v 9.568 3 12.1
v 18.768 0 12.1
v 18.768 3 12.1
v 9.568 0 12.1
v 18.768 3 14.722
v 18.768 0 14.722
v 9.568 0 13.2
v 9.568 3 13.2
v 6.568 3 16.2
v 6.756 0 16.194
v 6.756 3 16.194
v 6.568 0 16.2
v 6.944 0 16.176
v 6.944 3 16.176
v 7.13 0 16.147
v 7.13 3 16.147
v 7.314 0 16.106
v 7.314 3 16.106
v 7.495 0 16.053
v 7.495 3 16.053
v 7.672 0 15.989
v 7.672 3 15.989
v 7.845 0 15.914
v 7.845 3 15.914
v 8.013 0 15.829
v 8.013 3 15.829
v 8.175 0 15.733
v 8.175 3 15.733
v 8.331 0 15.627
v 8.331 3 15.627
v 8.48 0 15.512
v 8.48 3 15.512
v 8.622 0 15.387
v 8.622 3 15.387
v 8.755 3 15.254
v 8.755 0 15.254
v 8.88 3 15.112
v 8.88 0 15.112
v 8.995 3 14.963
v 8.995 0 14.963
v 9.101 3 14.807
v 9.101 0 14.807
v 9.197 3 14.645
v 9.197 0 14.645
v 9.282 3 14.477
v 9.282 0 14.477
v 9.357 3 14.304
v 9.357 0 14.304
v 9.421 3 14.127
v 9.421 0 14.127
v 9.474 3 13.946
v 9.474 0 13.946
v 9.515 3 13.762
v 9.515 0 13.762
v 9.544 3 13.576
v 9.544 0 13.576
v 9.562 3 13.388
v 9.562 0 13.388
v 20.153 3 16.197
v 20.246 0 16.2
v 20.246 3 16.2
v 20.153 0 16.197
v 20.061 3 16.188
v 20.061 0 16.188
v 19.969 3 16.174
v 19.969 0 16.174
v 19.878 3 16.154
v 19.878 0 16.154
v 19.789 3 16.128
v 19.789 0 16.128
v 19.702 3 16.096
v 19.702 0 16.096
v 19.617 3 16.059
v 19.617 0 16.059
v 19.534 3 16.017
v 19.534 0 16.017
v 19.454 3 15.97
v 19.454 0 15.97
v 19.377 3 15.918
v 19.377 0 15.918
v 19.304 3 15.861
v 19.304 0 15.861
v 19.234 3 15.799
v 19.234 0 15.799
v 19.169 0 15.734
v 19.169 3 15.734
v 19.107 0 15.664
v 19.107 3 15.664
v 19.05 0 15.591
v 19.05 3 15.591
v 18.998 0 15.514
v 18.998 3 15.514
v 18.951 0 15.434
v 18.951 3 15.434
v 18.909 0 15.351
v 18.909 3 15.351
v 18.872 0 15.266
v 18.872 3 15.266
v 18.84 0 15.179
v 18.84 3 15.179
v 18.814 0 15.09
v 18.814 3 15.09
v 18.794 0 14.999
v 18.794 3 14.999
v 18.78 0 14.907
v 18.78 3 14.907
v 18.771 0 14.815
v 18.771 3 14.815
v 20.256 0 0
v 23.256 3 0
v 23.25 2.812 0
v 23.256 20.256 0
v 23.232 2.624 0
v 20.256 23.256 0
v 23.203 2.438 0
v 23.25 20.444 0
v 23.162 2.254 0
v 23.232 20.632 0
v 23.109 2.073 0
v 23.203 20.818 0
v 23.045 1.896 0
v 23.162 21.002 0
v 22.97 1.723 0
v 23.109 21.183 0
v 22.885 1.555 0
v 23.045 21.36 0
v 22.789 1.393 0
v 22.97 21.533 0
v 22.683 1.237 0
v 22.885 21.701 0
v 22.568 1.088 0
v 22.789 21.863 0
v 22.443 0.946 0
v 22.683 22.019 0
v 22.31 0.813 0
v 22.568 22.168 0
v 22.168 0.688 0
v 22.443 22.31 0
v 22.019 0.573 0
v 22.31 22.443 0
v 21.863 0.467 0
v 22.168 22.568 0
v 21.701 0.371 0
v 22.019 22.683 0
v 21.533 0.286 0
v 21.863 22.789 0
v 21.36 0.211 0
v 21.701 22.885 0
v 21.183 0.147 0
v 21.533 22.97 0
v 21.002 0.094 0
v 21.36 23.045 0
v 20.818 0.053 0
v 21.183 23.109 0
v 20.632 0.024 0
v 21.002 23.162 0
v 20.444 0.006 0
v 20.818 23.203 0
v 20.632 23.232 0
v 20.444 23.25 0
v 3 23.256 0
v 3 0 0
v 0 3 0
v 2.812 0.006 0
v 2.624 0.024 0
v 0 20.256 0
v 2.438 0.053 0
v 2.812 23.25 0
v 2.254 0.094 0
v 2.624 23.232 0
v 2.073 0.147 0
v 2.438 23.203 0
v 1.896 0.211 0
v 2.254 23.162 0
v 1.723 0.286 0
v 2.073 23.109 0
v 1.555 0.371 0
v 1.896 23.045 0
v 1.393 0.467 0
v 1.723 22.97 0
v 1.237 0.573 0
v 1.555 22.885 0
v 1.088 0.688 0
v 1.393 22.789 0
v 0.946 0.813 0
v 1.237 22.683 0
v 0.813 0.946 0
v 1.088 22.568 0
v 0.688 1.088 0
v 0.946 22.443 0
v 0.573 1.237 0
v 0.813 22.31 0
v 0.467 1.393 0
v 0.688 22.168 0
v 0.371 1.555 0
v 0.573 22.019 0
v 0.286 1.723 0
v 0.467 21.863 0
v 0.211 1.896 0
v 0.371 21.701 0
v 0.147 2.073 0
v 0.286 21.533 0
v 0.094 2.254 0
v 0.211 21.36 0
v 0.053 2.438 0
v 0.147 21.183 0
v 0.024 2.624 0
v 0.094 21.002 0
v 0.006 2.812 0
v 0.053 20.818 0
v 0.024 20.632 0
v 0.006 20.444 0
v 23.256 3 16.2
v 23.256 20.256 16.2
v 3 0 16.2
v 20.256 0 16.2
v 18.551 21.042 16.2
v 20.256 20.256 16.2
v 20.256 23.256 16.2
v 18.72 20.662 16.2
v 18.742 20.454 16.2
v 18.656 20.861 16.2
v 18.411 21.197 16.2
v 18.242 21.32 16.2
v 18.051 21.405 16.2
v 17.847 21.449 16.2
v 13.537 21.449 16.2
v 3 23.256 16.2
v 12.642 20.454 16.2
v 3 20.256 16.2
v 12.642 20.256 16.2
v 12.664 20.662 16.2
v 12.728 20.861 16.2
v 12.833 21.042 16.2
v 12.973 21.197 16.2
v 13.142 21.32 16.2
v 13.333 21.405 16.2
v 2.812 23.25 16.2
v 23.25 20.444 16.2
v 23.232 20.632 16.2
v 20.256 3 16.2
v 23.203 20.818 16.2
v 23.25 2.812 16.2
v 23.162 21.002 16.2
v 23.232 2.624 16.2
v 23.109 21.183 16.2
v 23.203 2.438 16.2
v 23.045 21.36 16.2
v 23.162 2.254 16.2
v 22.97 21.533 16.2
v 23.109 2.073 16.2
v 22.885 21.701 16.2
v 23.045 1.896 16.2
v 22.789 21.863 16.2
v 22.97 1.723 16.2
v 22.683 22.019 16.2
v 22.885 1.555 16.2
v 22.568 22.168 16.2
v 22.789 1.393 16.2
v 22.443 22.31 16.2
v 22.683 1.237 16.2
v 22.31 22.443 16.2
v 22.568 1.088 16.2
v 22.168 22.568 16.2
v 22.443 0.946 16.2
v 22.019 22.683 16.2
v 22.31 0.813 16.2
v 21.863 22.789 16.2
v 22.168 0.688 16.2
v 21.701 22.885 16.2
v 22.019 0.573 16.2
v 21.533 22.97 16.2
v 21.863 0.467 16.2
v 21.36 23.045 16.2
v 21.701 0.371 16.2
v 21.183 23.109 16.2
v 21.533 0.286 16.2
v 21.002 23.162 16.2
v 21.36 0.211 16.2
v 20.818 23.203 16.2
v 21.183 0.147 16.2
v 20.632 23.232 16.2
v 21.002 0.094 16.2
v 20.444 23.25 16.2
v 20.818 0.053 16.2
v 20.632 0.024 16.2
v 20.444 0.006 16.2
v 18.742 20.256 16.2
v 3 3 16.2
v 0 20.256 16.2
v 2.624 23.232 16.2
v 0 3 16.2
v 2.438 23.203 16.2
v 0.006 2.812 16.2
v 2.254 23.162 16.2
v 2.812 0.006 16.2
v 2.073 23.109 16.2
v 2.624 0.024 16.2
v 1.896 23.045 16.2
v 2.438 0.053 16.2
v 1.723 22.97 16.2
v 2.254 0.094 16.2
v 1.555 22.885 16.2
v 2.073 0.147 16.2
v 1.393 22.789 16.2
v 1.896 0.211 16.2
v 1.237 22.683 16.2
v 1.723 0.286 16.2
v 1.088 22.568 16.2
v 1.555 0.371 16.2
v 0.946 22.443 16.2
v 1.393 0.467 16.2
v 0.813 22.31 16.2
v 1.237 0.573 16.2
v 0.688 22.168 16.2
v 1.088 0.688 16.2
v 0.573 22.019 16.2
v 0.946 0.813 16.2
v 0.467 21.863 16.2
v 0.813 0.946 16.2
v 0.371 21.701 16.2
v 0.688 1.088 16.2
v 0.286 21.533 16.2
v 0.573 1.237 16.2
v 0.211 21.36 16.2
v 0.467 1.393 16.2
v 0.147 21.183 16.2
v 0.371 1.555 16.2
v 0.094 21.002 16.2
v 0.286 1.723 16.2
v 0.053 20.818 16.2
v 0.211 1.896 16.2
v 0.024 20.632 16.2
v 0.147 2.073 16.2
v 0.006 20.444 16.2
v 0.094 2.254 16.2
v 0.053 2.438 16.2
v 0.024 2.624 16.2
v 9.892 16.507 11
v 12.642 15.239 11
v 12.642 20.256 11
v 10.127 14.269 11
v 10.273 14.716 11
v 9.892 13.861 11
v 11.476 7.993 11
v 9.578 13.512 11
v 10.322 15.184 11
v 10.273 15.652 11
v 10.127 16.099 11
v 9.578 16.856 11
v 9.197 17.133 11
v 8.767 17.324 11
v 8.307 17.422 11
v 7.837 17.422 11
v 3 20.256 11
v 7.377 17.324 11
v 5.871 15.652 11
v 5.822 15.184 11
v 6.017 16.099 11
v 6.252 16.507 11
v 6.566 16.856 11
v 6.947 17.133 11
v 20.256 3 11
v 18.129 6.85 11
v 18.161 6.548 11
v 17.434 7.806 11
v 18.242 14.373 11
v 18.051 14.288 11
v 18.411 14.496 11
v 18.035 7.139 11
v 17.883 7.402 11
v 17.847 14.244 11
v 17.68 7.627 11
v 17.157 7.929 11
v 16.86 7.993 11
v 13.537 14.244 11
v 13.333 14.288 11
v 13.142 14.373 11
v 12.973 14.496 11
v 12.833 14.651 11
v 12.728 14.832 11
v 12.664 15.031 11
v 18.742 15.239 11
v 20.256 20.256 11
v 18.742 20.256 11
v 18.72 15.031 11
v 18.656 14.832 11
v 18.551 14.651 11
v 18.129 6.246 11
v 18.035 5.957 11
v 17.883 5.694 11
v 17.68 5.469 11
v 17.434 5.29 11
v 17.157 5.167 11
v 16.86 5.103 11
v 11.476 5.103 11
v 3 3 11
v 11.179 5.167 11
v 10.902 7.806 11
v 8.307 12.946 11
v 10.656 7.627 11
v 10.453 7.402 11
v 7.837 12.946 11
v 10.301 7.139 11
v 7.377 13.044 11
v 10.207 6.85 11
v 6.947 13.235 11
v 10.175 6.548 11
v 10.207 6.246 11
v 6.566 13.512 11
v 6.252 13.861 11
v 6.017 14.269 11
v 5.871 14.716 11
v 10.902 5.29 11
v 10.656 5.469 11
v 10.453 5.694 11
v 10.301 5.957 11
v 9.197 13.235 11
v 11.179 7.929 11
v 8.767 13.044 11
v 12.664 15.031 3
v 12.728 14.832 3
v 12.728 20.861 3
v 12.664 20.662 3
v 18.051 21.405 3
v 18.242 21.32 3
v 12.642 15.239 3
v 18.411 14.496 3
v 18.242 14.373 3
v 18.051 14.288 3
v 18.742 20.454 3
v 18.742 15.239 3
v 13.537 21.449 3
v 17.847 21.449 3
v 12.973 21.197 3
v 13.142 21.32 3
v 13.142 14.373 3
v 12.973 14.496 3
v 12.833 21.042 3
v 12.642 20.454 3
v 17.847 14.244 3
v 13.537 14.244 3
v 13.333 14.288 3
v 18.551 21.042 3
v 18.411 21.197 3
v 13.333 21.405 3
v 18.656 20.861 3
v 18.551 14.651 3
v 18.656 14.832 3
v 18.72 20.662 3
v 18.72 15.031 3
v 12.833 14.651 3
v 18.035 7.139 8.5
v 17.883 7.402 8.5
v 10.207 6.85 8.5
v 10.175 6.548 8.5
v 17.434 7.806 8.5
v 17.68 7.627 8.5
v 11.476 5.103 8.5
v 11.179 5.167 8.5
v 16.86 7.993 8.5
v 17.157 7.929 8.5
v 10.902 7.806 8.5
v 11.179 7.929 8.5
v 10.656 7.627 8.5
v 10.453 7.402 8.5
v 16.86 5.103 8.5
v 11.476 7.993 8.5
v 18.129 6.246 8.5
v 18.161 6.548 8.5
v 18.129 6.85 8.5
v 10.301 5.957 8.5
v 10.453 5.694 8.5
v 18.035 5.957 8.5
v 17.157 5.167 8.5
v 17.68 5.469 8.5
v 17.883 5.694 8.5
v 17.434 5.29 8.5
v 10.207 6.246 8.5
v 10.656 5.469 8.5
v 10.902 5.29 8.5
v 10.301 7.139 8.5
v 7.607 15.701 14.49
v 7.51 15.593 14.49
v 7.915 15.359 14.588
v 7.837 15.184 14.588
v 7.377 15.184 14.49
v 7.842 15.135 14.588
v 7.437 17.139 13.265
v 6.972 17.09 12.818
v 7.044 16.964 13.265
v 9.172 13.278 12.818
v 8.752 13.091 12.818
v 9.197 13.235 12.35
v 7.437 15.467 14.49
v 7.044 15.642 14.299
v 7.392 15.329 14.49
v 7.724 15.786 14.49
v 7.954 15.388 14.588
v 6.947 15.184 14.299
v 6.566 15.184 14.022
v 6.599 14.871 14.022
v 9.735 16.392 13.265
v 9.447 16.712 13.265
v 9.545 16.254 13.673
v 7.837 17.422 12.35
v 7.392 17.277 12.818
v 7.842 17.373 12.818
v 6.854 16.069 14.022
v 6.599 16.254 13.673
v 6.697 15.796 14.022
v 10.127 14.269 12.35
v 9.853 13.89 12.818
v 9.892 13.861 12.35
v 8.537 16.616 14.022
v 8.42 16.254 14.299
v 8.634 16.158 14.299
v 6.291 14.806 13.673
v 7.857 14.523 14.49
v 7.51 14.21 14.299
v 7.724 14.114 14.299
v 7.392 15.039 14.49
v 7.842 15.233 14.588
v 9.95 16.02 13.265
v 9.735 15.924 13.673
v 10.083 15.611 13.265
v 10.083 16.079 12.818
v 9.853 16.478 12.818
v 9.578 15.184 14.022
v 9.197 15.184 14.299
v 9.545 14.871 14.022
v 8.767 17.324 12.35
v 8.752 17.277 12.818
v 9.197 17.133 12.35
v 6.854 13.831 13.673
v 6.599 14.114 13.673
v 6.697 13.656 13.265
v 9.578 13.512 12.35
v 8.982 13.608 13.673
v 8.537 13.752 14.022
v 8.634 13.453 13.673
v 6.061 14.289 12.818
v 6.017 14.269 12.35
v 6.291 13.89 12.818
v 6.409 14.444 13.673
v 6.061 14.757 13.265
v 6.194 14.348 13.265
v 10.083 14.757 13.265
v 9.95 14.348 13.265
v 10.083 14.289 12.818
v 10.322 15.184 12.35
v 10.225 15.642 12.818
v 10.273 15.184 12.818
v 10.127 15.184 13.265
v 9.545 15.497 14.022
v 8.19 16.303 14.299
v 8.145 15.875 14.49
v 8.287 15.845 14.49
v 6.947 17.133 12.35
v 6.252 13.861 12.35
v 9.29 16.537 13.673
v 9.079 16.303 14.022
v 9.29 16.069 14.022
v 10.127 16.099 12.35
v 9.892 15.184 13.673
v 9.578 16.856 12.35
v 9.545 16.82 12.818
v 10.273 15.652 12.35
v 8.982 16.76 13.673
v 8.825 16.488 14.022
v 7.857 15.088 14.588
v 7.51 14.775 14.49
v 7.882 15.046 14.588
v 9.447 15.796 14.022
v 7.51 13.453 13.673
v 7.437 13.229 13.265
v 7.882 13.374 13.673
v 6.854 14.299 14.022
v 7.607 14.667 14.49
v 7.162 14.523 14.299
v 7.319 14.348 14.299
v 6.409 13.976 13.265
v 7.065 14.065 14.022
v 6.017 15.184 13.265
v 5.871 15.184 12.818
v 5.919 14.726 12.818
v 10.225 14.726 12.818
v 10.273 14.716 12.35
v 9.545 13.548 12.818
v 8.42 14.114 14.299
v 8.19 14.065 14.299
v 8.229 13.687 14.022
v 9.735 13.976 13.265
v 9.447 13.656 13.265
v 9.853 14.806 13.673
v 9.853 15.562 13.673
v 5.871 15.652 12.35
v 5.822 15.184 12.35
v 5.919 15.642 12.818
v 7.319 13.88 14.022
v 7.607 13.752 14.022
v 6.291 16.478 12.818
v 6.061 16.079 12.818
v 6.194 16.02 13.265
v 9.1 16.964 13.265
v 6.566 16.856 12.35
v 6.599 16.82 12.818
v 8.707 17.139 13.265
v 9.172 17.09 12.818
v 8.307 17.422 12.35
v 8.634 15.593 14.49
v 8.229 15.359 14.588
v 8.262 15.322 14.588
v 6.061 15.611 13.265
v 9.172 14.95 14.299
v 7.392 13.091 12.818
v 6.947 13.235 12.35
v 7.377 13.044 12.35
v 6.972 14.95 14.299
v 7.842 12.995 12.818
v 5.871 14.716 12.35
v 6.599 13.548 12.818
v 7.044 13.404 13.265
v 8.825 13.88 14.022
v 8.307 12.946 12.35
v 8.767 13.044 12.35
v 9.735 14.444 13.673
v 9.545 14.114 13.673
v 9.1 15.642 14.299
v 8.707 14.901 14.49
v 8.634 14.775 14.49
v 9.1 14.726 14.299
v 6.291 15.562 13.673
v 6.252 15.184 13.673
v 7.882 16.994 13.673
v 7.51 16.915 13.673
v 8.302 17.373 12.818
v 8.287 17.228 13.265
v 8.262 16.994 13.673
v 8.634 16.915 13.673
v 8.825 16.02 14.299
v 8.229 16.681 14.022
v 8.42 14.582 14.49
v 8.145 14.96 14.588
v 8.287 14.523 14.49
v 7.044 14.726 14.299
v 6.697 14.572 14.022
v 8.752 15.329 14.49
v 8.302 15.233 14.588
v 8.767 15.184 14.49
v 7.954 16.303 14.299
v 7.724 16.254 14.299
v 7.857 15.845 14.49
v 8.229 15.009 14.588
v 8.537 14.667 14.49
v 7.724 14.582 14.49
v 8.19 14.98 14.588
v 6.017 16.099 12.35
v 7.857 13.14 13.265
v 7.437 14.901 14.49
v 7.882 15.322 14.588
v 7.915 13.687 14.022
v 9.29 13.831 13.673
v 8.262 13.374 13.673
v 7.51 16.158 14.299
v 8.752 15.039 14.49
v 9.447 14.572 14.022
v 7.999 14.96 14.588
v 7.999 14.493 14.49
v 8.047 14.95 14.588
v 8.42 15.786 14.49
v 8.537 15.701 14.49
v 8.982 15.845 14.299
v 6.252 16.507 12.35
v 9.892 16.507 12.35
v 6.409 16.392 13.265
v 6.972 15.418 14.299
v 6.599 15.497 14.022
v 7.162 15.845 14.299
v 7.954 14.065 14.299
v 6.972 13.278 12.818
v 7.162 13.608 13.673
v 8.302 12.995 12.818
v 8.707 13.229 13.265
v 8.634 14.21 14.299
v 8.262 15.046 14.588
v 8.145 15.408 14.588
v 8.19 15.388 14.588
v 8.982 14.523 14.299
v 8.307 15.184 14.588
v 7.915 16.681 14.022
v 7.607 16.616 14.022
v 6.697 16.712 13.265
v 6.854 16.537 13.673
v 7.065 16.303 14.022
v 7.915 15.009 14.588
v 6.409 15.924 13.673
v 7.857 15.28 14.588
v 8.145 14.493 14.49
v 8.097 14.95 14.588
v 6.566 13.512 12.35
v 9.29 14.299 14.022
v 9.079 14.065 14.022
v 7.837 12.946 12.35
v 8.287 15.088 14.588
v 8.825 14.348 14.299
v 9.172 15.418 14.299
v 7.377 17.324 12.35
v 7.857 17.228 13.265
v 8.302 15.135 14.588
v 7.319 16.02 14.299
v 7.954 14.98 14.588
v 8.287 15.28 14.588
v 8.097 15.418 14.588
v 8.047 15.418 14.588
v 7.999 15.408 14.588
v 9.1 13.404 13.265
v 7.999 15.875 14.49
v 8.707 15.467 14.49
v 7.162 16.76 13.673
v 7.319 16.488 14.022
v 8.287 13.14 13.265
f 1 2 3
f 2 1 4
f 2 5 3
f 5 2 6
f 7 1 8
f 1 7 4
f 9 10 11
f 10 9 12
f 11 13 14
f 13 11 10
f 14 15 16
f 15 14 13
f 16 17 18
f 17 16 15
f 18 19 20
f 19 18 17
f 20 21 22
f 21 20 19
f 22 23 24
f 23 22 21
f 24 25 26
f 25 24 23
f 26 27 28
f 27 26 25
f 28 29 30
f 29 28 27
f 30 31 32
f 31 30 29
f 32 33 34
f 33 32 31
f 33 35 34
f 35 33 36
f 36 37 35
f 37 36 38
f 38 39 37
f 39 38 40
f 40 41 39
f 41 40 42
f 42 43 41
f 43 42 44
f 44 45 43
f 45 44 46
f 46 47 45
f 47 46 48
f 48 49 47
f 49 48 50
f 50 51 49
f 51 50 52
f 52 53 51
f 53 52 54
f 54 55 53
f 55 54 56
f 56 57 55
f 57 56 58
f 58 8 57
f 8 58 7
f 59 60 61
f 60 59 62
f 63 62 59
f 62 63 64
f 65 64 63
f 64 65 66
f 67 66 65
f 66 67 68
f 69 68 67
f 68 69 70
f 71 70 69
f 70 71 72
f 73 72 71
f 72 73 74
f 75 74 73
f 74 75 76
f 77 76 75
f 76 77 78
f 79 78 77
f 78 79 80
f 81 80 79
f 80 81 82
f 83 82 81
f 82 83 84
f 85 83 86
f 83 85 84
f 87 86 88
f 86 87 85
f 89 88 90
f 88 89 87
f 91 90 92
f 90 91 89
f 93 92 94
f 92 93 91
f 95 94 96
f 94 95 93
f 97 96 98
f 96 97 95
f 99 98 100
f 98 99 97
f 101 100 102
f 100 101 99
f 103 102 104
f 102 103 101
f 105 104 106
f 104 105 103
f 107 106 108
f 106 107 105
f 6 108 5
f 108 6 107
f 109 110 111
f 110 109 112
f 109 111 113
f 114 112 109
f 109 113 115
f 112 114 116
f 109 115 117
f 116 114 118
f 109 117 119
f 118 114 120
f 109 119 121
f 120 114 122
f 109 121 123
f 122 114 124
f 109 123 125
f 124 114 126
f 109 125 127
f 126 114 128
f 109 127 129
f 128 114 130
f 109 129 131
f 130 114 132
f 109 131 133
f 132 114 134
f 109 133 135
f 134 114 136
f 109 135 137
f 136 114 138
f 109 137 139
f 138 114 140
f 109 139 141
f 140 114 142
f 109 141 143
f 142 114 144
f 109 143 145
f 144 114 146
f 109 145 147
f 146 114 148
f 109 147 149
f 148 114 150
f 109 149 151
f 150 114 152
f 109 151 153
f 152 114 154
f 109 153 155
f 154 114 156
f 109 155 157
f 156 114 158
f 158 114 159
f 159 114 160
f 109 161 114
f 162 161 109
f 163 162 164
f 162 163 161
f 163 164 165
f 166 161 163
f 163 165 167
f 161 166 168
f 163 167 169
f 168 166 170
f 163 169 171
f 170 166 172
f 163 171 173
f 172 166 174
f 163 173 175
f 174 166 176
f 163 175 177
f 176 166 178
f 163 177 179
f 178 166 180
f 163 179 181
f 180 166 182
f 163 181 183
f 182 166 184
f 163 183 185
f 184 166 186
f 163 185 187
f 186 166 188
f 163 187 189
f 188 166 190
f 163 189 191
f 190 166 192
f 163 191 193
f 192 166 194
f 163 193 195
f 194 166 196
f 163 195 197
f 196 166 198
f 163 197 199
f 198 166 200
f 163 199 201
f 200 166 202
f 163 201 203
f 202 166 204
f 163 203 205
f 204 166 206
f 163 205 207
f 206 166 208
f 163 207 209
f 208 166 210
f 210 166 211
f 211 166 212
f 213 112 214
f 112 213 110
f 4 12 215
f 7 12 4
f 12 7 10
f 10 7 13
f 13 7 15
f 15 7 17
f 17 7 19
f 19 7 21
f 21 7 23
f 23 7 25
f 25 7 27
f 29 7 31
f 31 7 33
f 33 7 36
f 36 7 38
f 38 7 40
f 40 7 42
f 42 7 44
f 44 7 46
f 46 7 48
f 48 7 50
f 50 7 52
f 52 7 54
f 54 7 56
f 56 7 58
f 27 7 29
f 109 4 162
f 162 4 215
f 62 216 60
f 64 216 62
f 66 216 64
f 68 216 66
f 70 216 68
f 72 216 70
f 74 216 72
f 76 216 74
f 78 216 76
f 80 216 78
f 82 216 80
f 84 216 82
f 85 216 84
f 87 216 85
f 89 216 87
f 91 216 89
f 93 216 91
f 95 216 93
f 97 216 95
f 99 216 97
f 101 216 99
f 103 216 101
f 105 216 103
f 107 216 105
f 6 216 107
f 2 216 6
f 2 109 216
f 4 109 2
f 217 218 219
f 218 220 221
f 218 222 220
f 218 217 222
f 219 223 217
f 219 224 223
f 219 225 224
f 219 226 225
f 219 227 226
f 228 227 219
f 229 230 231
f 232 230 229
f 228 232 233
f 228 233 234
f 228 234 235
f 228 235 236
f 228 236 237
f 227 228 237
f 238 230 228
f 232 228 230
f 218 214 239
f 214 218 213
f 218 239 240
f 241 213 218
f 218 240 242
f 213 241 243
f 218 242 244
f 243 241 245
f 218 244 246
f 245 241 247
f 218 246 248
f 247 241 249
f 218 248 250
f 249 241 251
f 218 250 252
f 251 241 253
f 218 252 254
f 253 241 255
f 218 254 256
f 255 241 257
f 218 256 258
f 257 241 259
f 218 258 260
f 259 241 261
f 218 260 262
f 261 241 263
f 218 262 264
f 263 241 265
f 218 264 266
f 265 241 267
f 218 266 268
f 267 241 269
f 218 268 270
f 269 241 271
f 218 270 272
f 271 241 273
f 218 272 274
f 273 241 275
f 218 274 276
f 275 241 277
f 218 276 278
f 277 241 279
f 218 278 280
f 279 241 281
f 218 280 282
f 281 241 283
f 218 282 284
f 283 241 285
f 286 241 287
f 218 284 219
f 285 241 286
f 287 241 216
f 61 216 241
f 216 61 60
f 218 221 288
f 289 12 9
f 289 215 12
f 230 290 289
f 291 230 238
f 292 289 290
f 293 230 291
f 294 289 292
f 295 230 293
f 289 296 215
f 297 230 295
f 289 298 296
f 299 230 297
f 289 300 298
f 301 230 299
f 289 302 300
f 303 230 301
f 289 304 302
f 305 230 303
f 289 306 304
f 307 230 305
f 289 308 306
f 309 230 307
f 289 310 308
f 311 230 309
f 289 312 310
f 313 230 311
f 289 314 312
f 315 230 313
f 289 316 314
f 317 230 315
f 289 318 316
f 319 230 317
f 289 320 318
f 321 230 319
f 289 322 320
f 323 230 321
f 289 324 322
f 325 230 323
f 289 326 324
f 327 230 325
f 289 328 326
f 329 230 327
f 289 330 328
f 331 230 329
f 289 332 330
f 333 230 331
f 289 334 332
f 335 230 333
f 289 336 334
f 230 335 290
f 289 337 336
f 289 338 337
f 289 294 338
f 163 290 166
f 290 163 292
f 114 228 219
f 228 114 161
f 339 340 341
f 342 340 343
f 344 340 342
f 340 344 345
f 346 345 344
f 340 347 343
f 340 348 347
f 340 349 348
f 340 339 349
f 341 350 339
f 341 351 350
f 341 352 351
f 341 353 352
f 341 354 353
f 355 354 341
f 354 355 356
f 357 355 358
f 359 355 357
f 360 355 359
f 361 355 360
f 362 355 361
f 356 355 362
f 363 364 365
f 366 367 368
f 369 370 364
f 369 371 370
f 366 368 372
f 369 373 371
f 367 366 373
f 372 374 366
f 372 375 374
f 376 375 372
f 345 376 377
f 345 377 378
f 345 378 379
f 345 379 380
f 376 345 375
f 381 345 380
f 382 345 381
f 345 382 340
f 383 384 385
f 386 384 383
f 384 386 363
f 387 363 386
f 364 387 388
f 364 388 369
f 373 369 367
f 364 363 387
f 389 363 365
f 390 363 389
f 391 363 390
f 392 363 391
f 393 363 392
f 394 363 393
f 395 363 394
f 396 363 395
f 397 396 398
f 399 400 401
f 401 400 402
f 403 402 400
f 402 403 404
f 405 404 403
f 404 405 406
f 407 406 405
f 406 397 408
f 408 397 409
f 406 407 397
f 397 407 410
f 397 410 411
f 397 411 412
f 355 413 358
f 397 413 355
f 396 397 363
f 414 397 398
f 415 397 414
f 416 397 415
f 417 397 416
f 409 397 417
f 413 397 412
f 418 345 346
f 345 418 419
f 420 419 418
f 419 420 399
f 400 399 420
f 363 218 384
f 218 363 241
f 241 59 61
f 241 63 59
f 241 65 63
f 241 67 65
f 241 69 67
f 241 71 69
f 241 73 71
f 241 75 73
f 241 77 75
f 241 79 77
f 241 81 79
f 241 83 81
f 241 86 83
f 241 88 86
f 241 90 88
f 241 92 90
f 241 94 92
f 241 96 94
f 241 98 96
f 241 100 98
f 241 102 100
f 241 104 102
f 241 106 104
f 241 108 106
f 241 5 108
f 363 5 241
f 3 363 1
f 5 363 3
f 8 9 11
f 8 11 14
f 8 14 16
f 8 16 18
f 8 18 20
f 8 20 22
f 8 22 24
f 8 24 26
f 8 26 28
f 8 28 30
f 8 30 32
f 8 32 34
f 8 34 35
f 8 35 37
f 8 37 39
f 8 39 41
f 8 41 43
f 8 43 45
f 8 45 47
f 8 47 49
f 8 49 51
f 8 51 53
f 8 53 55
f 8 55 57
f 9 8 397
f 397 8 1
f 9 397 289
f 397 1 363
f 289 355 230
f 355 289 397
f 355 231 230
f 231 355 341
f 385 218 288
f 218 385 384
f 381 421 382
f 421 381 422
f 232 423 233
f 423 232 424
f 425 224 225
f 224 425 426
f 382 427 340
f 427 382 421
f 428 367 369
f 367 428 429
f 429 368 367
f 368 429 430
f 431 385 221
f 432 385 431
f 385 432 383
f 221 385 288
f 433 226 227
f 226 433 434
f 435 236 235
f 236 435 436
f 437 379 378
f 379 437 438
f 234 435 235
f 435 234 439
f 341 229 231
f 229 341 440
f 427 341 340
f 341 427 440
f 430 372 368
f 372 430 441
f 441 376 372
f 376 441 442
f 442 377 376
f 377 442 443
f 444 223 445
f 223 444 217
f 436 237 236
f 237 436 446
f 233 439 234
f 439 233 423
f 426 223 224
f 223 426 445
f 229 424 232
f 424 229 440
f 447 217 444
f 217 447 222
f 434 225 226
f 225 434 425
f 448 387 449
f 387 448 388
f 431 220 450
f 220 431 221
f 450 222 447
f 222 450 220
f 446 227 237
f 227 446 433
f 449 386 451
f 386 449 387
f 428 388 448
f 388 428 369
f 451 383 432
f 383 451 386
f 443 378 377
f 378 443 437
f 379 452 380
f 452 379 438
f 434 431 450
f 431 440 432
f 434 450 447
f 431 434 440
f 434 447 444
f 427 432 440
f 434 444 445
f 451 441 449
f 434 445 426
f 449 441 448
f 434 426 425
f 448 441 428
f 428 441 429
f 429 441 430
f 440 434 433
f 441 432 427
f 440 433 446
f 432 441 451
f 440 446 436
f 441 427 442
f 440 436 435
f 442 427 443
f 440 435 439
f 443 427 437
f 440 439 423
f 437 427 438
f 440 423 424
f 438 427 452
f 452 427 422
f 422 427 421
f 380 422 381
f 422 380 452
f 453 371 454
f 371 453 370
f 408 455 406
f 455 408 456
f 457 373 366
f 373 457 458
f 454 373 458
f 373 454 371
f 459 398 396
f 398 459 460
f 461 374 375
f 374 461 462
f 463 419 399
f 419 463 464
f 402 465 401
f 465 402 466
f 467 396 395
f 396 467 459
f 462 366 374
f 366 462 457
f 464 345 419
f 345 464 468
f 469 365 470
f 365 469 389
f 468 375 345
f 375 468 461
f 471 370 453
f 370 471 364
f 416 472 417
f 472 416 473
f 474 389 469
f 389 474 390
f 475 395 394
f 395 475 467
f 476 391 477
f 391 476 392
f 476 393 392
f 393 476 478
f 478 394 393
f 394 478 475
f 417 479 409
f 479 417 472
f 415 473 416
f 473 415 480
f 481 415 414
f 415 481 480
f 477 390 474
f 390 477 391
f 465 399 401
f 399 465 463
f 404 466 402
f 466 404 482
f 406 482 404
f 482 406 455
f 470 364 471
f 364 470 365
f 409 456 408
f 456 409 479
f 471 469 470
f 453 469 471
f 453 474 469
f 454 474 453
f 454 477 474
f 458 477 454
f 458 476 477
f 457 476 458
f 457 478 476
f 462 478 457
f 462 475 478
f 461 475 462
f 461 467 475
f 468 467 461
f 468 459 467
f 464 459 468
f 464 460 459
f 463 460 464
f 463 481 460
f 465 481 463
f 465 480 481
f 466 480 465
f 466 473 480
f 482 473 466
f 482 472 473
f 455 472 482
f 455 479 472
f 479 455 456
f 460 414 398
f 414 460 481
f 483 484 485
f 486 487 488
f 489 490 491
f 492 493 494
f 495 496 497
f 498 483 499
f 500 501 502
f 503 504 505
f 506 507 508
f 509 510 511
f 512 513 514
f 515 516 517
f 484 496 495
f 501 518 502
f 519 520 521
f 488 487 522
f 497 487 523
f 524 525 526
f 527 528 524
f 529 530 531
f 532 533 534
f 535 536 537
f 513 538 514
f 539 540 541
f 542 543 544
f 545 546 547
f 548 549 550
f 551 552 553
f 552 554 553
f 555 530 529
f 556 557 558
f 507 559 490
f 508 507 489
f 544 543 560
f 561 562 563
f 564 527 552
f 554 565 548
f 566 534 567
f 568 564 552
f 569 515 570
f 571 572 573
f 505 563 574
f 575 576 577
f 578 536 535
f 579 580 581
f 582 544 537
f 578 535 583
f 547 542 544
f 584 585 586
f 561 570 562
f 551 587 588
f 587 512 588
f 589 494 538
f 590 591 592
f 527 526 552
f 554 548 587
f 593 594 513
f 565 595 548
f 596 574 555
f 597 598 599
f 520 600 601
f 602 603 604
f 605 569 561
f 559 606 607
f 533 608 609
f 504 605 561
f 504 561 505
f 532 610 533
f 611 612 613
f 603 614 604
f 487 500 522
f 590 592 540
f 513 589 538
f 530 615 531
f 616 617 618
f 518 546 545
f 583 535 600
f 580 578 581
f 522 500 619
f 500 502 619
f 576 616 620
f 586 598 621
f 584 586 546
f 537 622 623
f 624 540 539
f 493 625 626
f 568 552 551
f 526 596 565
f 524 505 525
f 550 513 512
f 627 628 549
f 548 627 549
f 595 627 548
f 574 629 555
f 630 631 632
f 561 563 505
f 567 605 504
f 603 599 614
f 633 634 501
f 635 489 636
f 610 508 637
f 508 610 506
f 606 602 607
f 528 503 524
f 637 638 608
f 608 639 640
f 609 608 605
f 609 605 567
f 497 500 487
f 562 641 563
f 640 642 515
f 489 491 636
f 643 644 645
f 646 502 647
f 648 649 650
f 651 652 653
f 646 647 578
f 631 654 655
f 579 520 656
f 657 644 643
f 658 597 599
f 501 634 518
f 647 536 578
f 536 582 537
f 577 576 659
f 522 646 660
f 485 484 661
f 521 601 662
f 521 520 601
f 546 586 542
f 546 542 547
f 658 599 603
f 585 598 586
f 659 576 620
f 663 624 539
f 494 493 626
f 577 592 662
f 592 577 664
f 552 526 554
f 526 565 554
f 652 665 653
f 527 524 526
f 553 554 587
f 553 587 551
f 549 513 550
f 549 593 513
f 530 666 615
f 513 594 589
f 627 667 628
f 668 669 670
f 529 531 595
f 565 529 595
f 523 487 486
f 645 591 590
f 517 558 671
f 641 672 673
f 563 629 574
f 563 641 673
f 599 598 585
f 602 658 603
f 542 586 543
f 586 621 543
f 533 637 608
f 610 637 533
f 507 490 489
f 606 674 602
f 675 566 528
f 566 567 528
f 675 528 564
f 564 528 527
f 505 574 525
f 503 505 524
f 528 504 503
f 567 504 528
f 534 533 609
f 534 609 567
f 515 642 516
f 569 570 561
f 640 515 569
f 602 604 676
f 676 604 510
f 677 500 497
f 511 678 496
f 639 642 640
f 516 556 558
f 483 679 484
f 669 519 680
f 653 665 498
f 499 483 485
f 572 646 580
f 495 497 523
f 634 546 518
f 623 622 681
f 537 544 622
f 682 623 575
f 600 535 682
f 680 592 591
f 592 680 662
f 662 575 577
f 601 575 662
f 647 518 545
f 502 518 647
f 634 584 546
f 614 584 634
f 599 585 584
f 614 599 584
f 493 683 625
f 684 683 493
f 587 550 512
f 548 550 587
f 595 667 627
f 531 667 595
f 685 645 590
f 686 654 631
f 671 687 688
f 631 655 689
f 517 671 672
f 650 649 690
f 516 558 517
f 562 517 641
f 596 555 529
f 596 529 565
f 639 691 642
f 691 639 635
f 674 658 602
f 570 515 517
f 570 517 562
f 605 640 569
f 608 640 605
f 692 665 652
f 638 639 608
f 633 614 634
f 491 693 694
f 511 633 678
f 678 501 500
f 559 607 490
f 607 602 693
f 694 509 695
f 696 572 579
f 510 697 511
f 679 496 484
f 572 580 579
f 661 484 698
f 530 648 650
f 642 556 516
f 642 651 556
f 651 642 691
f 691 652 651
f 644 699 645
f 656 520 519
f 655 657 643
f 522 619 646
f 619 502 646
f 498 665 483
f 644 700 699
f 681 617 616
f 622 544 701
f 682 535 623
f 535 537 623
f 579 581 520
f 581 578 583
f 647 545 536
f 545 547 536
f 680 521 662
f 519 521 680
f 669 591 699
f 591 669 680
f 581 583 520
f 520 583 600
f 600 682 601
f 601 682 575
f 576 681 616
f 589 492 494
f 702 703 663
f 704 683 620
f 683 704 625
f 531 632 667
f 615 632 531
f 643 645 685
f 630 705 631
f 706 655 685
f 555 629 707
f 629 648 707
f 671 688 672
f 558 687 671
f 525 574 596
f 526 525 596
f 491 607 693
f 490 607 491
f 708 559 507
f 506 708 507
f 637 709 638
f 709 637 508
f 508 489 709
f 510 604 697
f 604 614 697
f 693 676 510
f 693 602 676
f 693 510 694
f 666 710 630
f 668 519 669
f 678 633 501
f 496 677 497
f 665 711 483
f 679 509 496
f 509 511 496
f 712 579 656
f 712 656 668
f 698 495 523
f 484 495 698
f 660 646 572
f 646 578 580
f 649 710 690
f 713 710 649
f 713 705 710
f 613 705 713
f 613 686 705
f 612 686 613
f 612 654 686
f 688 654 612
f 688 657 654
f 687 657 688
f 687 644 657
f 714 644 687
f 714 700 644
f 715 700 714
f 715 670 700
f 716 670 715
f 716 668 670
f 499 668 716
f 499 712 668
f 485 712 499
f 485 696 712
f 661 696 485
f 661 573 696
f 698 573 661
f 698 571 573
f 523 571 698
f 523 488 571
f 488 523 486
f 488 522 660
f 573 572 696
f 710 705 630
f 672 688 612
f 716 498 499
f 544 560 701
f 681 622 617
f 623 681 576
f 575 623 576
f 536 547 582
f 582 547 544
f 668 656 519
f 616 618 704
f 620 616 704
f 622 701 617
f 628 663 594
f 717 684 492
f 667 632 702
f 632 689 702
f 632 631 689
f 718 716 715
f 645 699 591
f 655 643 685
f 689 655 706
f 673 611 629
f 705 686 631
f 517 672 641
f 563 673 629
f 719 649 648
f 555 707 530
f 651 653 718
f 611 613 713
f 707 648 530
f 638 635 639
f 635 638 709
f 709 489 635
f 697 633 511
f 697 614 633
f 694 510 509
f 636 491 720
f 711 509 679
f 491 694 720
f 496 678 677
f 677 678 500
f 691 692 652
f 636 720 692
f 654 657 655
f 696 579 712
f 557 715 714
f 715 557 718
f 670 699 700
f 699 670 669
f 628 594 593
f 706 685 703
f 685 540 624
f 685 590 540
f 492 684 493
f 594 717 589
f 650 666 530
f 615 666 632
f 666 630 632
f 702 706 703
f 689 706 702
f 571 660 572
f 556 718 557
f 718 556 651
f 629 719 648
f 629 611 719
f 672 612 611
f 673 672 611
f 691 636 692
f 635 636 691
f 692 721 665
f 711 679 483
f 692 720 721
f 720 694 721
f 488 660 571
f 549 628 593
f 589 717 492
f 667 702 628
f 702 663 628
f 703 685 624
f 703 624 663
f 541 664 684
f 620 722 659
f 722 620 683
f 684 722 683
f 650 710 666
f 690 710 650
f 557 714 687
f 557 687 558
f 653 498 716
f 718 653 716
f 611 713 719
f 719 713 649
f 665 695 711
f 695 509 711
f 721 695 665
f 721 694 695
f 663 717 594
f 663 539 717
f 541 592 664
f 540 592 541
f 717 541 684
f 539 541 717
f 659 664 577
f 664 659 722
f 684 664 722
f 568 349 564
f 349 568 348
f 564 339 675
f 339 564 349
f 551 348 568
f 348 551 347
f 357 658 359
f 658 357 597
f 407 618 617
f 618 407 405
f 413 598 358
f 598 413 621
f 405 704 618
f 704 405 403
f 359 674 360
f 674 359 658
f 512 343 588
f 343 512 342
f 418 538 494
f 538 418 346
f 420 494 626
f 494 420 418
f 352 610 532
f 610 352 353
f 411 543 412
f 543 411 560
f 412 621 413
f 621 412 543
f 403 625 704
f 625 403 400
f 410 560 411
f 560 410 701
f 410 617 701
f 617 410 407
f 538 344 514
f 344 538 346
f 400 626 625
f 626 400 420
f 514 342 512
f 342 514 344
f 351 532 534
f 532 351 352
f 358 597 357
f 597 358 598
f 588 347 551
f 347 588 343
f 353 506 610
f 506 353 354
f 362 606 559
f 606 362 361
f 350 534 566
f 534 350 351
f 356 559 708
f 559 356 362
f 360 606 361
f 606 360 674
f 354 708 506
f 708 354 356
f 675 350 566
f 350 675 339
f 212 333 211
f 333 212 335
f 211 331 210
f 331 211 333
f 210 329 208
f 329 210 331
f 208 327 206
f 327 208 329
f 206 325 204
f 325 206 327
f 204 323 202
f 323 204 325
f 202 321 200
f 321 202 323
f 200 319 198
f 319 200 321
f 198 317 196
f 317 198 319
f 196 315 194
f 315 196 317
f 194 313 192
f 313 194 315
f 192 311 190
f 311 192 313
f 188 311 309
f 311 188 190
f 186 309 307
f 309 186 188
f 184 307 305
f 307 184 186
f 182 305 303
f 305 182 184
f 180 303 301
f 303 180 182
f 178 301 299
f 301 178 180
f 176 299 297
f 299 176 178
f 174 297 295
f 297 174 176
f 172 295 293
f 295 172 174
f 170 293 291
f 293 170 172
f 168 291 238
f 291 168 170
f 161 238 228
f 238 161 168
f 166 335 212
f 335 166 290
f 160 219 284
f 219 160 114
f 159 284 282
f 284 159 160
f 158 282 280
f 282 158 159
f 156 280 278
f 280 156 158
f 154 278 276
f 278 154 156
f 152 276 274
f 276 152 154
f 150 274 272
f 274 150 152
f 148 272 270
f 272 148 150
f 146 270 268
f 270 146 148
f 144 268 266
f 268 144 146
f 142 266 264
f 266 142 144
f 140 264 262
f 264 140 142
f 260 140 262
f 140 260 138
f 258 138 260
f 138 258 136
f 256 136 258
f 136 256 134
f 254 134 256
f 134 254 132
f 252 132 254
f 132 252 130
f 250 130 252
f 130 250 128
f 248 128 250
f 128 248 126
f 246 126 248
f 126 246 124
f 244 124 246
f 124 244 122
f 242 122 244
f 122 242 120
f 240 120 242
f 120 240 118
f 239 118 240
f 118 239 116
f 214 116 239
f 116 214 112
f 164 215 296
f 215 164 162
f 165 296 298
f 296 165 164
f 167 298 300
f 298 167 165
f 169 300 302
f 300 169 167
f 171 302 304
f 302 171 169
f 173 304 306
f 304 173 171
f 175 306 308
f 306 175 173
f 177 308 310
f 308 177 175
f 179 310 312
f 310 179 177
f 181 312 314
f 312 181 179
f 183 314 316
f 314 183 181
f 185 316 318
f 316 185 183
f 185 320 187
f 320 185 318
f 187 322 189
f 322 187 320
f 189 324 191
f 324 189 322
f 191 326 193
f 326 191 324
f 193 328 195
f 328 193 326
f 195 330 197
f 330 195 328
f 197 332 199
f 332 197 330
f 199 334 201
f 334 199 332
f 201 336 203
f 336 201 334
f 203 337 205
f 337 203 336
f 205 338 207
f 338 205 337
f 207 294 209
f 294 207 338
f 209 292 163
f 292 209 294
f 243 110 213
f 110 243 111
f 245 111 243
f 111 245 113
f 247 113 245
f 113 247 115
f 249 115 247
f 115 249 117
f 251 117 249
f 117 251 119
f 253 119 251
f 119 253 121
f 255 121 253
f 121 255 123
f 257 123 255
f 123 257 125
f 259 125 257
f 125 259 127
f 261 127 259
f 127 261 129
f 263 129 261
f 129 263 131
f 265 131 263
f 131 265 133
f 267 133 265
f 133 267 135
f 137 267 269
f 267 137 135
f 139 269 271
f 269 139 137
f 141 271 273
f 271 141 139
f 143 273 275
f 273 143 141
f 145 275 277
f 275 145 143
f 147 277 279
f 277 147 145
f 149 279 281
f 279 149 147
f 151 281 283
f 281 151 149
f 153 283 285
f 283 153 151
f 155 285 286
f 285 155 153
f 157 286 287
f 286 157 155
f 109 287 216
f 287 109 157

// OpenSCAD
// file: ../m4_dimensions.scad
/*
   Copyright 2015-2018 Scott Bezek and the splitflap contributors

   Licensed under the Apache License, Version 2.0 (the "License");
   you may not use this file except in compliance with the License.
   You may obtain a copy of the License at

       http://www.apache.org/licenses/LICENSE-2.0

   Unless required by applicable law or agreed to in writing, software
   distributed under the License is distributed on an "AS IS" BASIS,
   WITHOUT WARRANTIES OR CONDITIONS OF ANY KIND, either express or implied.
   See the License for the specific language governing permissions and
   limitations under the License.
*/

// M4 bolts
m4_hole_diameter = 4.5;
m4_bolt_length = 10;
m4_button_head_diameter = 7.6 + .2;
m4_button_head_length = 2.2 + .2;
m4_nut_width_flats = 7 + .2;
m4_nut_width_corners = 7/cos(180/6);
m4_nut_width_corners_padded = m4_nut_width_corners + .2;
m4_nut_length = 3.2;
m4_nut_length_padded = m4_nut_length + .2;
// file: ../sensor_pcb_dimensions.scad
/*
   Copyright 2018 Scott Bezek and the splitflap contributors

   Licensed under the Apache License, Version 2.0 (the "License");
   you may not use this file except in compliance with the License.
   You may obtain a copy of the License at

       http://www.apache.org/licenses/LICENSE-2.0

   Unless required by applicable law or agreed to in writing, software
   distributed under the License is distributed on an "AS IS" BASIS,
   WITHOUT WARRANTIES OR CONDITIONS OF ANY KIND, either express or implied.
   See the License for the specific language governing permissions and
   limitations under the License.
*/

include <m4_dimensions.scad>;

pcb_thickness = 1.6;
sensor_spool_distance = 0.70;  // distance from the sensor to the face of the spool

// From datasheet:
hall_effect_height = (2.8 + 3.2) / 2;
hall_effect_width = (3.9 + 4.3) / 2;
hall_effect_thickness = (1.40 + 1.60) / 2;
hall_effect_sensor_offset_y = hall_effect_height - 1.25;
hall_effect_pin_length_max = 14.5;

// From sensor.kicad_pcb:
pcb_height = 16.256;
pcb_length = 16.256;
pcb_hole_to_sensor_pin_1_x = 10.16;
pcb_hole_to_sensor_pin_1_y = 1.27;
sensor_pin_pitch = 2.54;
pcb_hole_to_connector_pin_1_x = 8.636;
pcb_hole_to_connector_pin_1_y = 8.636;
connector_pin_pitch = 2.54;
pcb_edge_to_hole_x = 4.572;
pcb_edge_to_hole_y = 4.572;

pcb_adjustment_range = 4;
pcb_hole_radius = m4_hole_diameter/2;

// Jig dimensions
pcb_jig_corner_fillet = 2;
pcb_jig_align_thickness = 2;
pcb_jig_align_length = 0;  // past the PCB thickness
pcb_jig_align_clearance = 0.25;  // on x, around the PCB
pcb_jig_depth_clearance = 0.1;  // on y, from sensor to jig


// Computed dimensions
pcb_hole_to_sensor_x = pcb_hole_to_sensor_pin_1_x - sensor_pin_pitch;
pcb_hole_to_sensor_y = pcb_hole_to_sensor_pin_1_y + hall_effect_sensor_offset_y;


// Rough numbers for 3d rendering only (non-critical dimensions)
pcb_connector_height = 3.2;
pcb_connector_width = 8.2;
pcb_connector_length = 18;
pcb_connector_pin_width = 0.64;
pcb_connector_pin_slop = 0.4;
pcb_connector_pin_tail_length = 3.05 + 2.5/2;

pcb_sensor_pin_width = 0.43;
// file: ../pcb.scad
/*
   Copyright 2015-2018 Scott Bezek and the splitflap contributors

   Licensed under the Apache License, Version 2.0 (the "License");
   you may not use this file except in compliance with the License.
   You may obtain a copy of the License at

       http://www.apache.org/licenses/LICENSE-2.0

   Unless required by applicable law or agreed to in writing, software
   distributed under the License is distributed on an "AS IS" BASIS,
   WITHOUT WARRANTIES OR CONDITIONS OF ANY KIND, either express or implied.
   See the License for the specific language governing permissions and
   limitations under the License.
*/
include <m4_dimensions.scad>;
include <sensor_pcb_dimensions.scad>;


module pcb_outline_2d(hole=true) {
    difference() {
        translate([-pcb_edge_to_hole_x, -pcb_height + pcb_edge_to_hole_y]) {
            square([pcb_length, pcb_height]);
        }
        if(hole) {
            circle(r=m4_hole_diameter/2, $fn=30);
        }
    }
}

// 3D PCB module, origin at the center of the mounting hole on the bottom surface of the PCB
module pcb(pcb_to_spool, render_jig=false, jig_thickness=0) {
    color([0, 0.5, 0]) {
        linear_extrude(height=pcb_thickness) {
            pcb_outline_2d();
        }
    }

    // Connector
    color([0, 0, 0]) {
        translate([pcb_hole_to_connector_pin_1_x - connector_pin_pitch - pcb_connector_width/2, -pcb_hole_to_connector_pin_1_y - pcb_connector_length, pcb_thickness]) {
            cube([pcb_connector_width, pcb_connector_length, pcb_connector_height]);
        }
    }

    // Connector pins
    color([0.5, 0.5, 0.5]) {
        translate([pcb_hole_to_connector_pin_1_x - pcb_connector_pin_width/2, -pcb_hole_to_connector_pin_1_y - pcb_connector_pin_width/2, -pcb_connector_pin_tail_length + pcb_thickness + 2.5/2]) {
            cube([pcb_connector_pin_width, pcb_connector_pin_width, pcb_connector_pin_tail_length]);
            translate([-connector_pin_pitch, 0, 0]) {
                cube([pcb_connector_pin_width, pcb_connector_pin_width, pcb_connector_pin_tail_length]);
            }
            translate([-connector_pin_pitch * 2, 0, 0]) {
                cube([pcb_connector_pin_width, pcb_connector_pin_width, pcb_connector_pin_tail_length]);
            }
        }
    }

    // Sensor pins
    color([0.5, 0.5, 0.5]) {
        pin_extra_length = 0.1;  // pins excess sticking out from the back of the PCB
        sensor_z_offset = pcb_to_spool - sensor_spool_distance - hall_effect_thickness/2 - 0.1;
        sensor_pin_length = sensor_z_offset + pcb_thickness + pin_extra_length;
        assert(sensor_pin_length < hall_effect_pin_length_max, "Warning: design is too thick to fit sensor");

        translate([pcb_hole_to_sensor_pin_1_x - pcb_sensor_pin_width/2, pcb_hole_to_sensor_pin_1_y - pcb_sensor_pin_width/2, -sensor_z_offset]) {
            cube([pcb_sensor_pin_width, pcb_sensor_pin_width, sensor_pin_length]);
            translate([-sensor_pin_pitch, 0, 0]) {
                cube([pcb_sensor_pin_width, pcb_sensor_pin_width, sensor_pin_length]);
            }
            translate([-sensor_pin_pitch * 2, 0, 0]) {
                cube([pcb_sensor_pin_width, pcb_sensor_pin_width, sensor_pin_length]);
            }
        }
    }

    // Sensor body
    color([0, 0, 0]) {
        translate([pcb_hole_to_sensor_pin_1_x - sensor_pin_pitch - hall_effect_width/2, pcb_hole_to_sensor_pin_1_y, -pcb_to_spool + sensor_spool_distance]) {
            cube([hall_effect_width, hall_effect_height, hall_effect_thickness]);
        }
    }

    // Jig
    if(render_jig) {
        color([1, 1, 0])
        translate([-pcb_edge_to_hole_x - pcb_jig_align_thickness - pcb_jig_align_clearance, pcb_hole_to_sensor_pin_1_y + pcb_sensor_pin_width/2 + thickness, -pcb_to_sensor(pcb_to_spool) + pcb_jig_depth_clearance])
        rotate([90, 0, 0])
            sensor_jig(pcb_to_spool, jig_thickness);
    }
}

// 2D cutouts needed to mount the PCB module, origin at the center of the mounting hole
module pcb_cutouts(adjustment_range=pcb_adjustment_range) {
    hull_slide(delta=adjustment_range) {
        // Bolt slot
        hull() {
            circle(r=m4_hole_diameter/2, $fn=30);
            translate([pcb_hole_to_sensor_pin_1_x + sensor_pin_pitch - m4_hole_diameter/2, 0, 0])
                circle(r=m4_hole_diameter/2, $fn=30);
        }
        // Pin header slot
        translate([pcb_hole_to_connector_pin_1_x - connector_pin_pitch, -pcb_hole_to_connector_pin_1_y]) {
            hull() {
                pin_slot_height = pcb_connector_pin_width + pcb_connector_pin_slop;
                pin_slot_width = connector_pin_pitch * 4 - pin_slot_height;
                translate([pin_slot_width/2, 0, 0])
                    circle(pin_slot_height/2, $fn=15);
                translate([-pin_slot_width/2, 0, 0])
                    circle(pin_slot_height/2, $fn=15);
            }
        }
    }
}

module hull_slide(delta) {
    for (i = [0:$children - 1]) {
        hull() {
            translate([-delta, 0]) {
                children(i);
            }
            translate([delta, 0]) {
                children(i);
            }
        }
    }
}

function pcb_to_sensor(pcb_to_spool) = pcb_to_spool - sensor_spool_distance - hall_effect_thickness;  // using sensor rear face
function pcb_hole_to_sensor_x() = pcb_hole_to_sensor_x;
function pcb_hole_to_sensor_y() = pcb_hole_to_sensor_y;
function pcb_thickness() = pcb_thickness;
function sensor_jig_height(pcb_to_spool) = pcb_to_sensor(pcb_to_spool) - pcb_jig_depth_clearance + pcb_jig_align_length + pcb_thickness;
function sensor_jig_width(pcb_to_spool) = pcb_length + (pcb_jig_align_thickness + pcb_jig_align_clearance) * 2;

module sensor_jig(pcb_to_spool, thickness) {
    module fillet() {
        eps = 0.01;
        difference() {
            translate([-eps, -eps, 0])
                square(pcb_jig_corner_fillet + eps);
            translate([pcb_jig_corner_fillet, pcb_jig_corner_fillet, 0])
                circle(r=pcb_jig_corner_fillet, $fn=20);
        }
    }

    linear_extrude(thickness) {
        difference() {
        union() {
            square([sensor_jig_width(pcb_to_spool), pcb_to_sensor(pcb_to_spool) - pcb_jig_depth_clearance]);  // main body
            square([pcb_jig_align_thickness, sensor_jig_height(pcb_to_spool)]);  // alignment edge, left
            translate([sensor_jig_width(pcb_to_spool) - pcb_jig_align_thickness, 0])
            square([pcb_jig_align_thickness, sensor_jig_height(pcb_to_spool)]);  // alignment edge, right
        }
        fillet();
        mirror([1, 0, 0])
            translate([-sensor_jig_width(pcb_to_spool), 0, 0])
                fillet();
        }
    }
}

// Example usage:
pcb(10);
// main file
/*
   Copyright 2020 Scott Bezek and the splitflap contributors

   Licensed under the Apache License, Version 2.0 (the "License");
   you may not use this file except in compliance with the License.
   You may obtain a copy of the License at

       http://www.apache.org/licenses/LICENSE-2.0

   Unless required by applicable law or agreed to in writing, software
   distributed under the License is distributed on an "AS IS" BASIS,
   WITHOUT WARRANTIES OR CONDITIONS OF ANY KIND, either express or implied.
   See the License for the specific language governing permissions and
   limitations under the License.
*/

use <../pcb.scad>;
include <../sensor_pcb_dimensions.scad>;
include <../m4_dimensions.scad>;

render_pcb = false;  // draw PCB in position in case
cases_per_row = 1;  // number of cases per each row
dual_rows = false;  // whether to put mirrored cases on the opposite side

case_wall_thickness = 3;  // thickness of the case walls around the PCB, XY
case_bottom_thickness = 3;  // thickness of the case below the PCB, Z
case_fillet_radius = 3;  // radius for the corner fillets on the outside of the case

pcb_edge_clearance = 0.5;  // distance between the PCB and the case, XY
pcb_depth_clearance = 2;  // distance above the PCB in the case (including the connector)
pcb_hole_clearance = 0;  // clearance between the hole boss and the PCB hole edge, XY

hall_effect_x_clearance = 1;  // distance between the hall effect sensor and the pocket walls, along X (less variability)
hall_effect_y_clearance = 2;  // distance between the hall effect sensor and the pocket walls, along Y (more variability)
hall_effect_pocket_depth = 8;  // depth of the hall effect pocket from the cutting plane
hall_effect_pocket_radius = 1;  // radius for the rounded corners of the hall effect pocket

connector_body_clearance = 0.5;  // distance between the connector and the case, XY
connector_body_z_offset = pcb_thickness - 0.5;  // distance between the connector body and the case, Z
connector_body_fillet = 3;  // rounded fillet on the connector body opening
connector_pin_clearance = 1;  // distance between the connector pins and the cutout walls, XY
connector_pin_depth = 2.5;  // depth of the connector pin cutout

mounting_boss_height = pcb_thickness + 0.4;  // distance above the PCB for the mounting hole boss


// calculations
eps = 0.01;
pcb_to_spool = 7.8;  // dummy for PCB render, as we don't have the whole assembly for this value

combined_clearance = pcb_edge_clearance + case_wall_thickness;  // total edge clearance, from PCB edge to outside edge
pcb_cutout_depth = pcb_thickness + pcb_connector_height/2 + pcb_depth_clearance;  // depth of the PCB cutout, from top

case_width = pcb_length + combined_clearance * 2;  // total case width, along X
case_length = pcb_height + combined_clearance * 2;  // total case length, along Y
case_height = case_bottom_thickness + hall_effect_pocket_depth + pcb_cutout_depth;  // total case height, along Z

case_x_offset = pcb_edge_to_hole_x + combined_clearance;  // x offset from the origin to the left corner
case_y_offset = case_width - pcb_edge_to_hole_y - combined_clearance;  // y offset from the origin to the left corner

pcb_cutout_plane = case_height - pcb_cutout_depth;  // PCB cutout Z position, from bottom (origin)
mounting_boss_radius = m4_hole_diameter/2 - pcb_hole_clearance;  // radius for the extruded feature through the mounting hole
mounting_sphere_z = pcb_cutout_plane + pcb_thickness + mounting_boss_height - mounting_boss_radius;  // Z position of the mounting sphere boss
connector_cutout_depth = pcb_cutout_depth - connector_body_z_offset;  // cutout depth of the connector, from top


module fillet_tool(radius) {
    difference() {
        translate([-eps, -eps])
            square(radius + eps);
        translate([radius, radius, 0])
            circle(r=radius, $fn=100);
    }
}

module fillet_case(w, h) {
    translate([0, 0, -eps])
    linear_extrude(case_height + eps*2) {
        // bottom left
        fillet_tool(case_fillet_radius);

        // top left
        translate([0, h])
            mirror([0, 1, 0])
                fillet_tool(case_fillet_radius);

        translate([w, 0]) {
            mirror([1, 0, 0]) {
                // bottom right
                fillet_tool(case_fillet_radius);
                
                // top right
                translate([0, h])
                    mirror([0, 1, 0])
                        fillet_tool(case_fillet_radius);
            }
        }
    }
}

module mounting_boss() {
    union() {
        translate([0, 0, mounting_sphere_z])
            sphere(r=mounting_boss_radius, $fn=30);

        // if we need to make a column to extend it out
        if(mounting_sphere_z > pcb_cutout_plane) {
            translate([0, 0, pcb_cutout_plane])
                linear_extrude(height=mounting_sphere_z - pcb_cutout_plane)
                    circle(r=mounting_boss_radius, $fn=30);
        }
    }
}

module connector_pin_pocket() {
    pocket_radius = (pcb_connector_pin_width * sqrt(2)) / 2 + connector_pin_clearance;  // square pin inscribed inside circle, plus clearance

    translate([0, 0, pcb_cutout_plane - connector_pin_depth])
    linear_extrude(height=connector_pin_depth + eps)
        translate([pcb_hole_to_connector_pin_1_x, -pcb_hole_to_connector_pin_1_y, 0]) {
            hull() { 
                for(i = [0 : 2]) {
                    translate([-connector_pin_pitch * i, 0, 0])
                        circle(r=pocket_radius, $fn=30);
                }
            }
        }
}

module connector_body_cutout() {
    // translation offsets from origin to front left corner of connector body
    x_offset = pcb_hole_to_connector_pin_1_x - connector_pin_pitch - pcb_connector_width/2;
    y_offset = -pcb_hole_to_connector_pin_1_y - pcb_connector_length;
    z_offset = case_height - connector_cutout_depth;

    // calculation for right fillet
    right_edge = x_offset + pcb_connector_width + connector_body_clearance;  // X coordinate from left edge to right edge of cutout
    right_gap = (case_width - case_x_offset) - case_wall_thickness - right_edge;  // X distance between right edge of connector and start of right case wall
    right_radius = min(connector_body_fillet, right_gap - eps);  // largest fillet that fits in the space

    module connector_fillet(radius) {
        translate([0, 0, z_offset + connector_cutout_depth])
            translate([x_offset - connector_body_clearance, y_offset - connector_body_clearance, 0])
                mirror([1, 0, 0])  // fillet facing case edge
                rotate([-90, 0, 0])  // extruding towards case center
                linear_extrude(height=pcb_connector_length + connector_body_clearance*2)
                    fillet_tool(radius);
    }

    union() {
        // main body
        translate([0, 0, z_offset])
            linear_extrude(height=connector_cutout_depth + eps)
            offset(delta=connector_body_clearance)
                translate([x_offset, y_offset, pcb_thickness])
                square([pcb_connector_width, pcb_connector_length]);
        
        // left fillet
        connector_fillet(connector_body_fillet);

        // right fillet
        translate([(x_offset - connector_body_clearance)*2 + pcb_connector_width + connector_body_clearance*2, 0])
            mirror([1, 0, 0])
                connector_fillet(right_radius);
    }
}

module hall_effect_pocket() {
    pocket_size_x = hall_effect_width + hall_effect_x_clearance * 2;
    pocket_size_y = hall_effect_height + pcb_sensor_pin_width/2 + hall_effect_y_clearance * 2;

    pocket_offset_x = (pocket_size_x / 2) - hall_effect_pocket_radius;
    pocket_offset_y = (pocket_size_y / 2) - hall_effect_pocket_radius;

    pocket_offset_z = case_height - pcb_cutout_depth - hall_effect_pocket_depth;
    pocket_depth = pcb_cutout_depth + hall_effect_pocket_depth;

    translate([0, 0, pocket_offset_z])
        linear_extrude(height=pocket_depth + eps)
            translate([pcb_hole_to_sensor_pin_1_x - sensor_pin_pitch, pcb_hole_to_sensor_pin_1_y + hall_effect_height/2 - pcb_sensor_pin_width/4, 0]) {
                // filleted version, using 'hull' and X/Y offsets based on pocket size
                if(hall_effect_pocket_radius > eps) {
                    hull() {
                        translate([-pocket_offset_x, pocket_offset_y])
                            circle(r=hall_effect_pocket_radius, $fn=30);
                        translate([pocket_offset_x, pocket_offset_y])
                            circle(r=hall_effect_pocket_radius, $fn=30);
                        translate([-pocket_offset_x, -pocket_offset_y])
                            circle(r=hall_effect_pocket_radius, $fn=30);
                        translate([pocket_offset_x, -pocket_offset_y])
                            circle(r=hall_effect_pocket_radius, $fn=30);
                    }
                } else {
                    // non-filleted version, using a basic 'square' on center
                    square([pocket_size_x, pocket_size_y], center=true);
                }
            }
}

module pcb_case(with_pcb=false) {
    translate([case_x_offset, case_y_offset]) {
        union() {
            difference() {
                // case body
                linear_extrude(height=case_height)
                    offset(delta=combined_clearance)
                        pcb_outline_2d(hole=false);

                // PCB cutout
                translate([0, 0, pcb_cutout_plane])
                    linear_extrude(height=pcb_cutout_depth + eps)
                        offset(delta=pcb_edge_clearance)
                            pcb_outline_2d(hole=false);

                hall_effect_pocket();
                connector_pin_pocket();
                connector_body_cutout();
            }
            mounting_boss();
        }

        if(with_pcb) {
            translate([0, 0, pcb_cutout_plane])
                pcb(pcb_to_spool);
        }
    }
}

module pcb_case_multi(num=1) {
    union() {
        for(x = [0 : num - 1]) {
            translate([x * (case_width - case_wall_thickness), 0])
            pcb_case(render_pcb);
        }
    }
}

module pcb_case_complete(columns=1, dual=false) {
    multi_case_width = case_width*columns - case_wall_thickness * (columns - 1);
    multi_case_length = dual ? case_length * 2 : case_length;

    difference() {
        union() {
            pcb_case_multi(columns);
            if(dual) {
                translate([multi_case_width, multi_case_length, 0])
                rotate([0, 0, 180])
                pcb_case_multi(columns);
            }
        }
        fillet_case(multi_case_width, multi_case_length);
    }
}

pcb_case_complete(cases_per_row, dual_rows);
